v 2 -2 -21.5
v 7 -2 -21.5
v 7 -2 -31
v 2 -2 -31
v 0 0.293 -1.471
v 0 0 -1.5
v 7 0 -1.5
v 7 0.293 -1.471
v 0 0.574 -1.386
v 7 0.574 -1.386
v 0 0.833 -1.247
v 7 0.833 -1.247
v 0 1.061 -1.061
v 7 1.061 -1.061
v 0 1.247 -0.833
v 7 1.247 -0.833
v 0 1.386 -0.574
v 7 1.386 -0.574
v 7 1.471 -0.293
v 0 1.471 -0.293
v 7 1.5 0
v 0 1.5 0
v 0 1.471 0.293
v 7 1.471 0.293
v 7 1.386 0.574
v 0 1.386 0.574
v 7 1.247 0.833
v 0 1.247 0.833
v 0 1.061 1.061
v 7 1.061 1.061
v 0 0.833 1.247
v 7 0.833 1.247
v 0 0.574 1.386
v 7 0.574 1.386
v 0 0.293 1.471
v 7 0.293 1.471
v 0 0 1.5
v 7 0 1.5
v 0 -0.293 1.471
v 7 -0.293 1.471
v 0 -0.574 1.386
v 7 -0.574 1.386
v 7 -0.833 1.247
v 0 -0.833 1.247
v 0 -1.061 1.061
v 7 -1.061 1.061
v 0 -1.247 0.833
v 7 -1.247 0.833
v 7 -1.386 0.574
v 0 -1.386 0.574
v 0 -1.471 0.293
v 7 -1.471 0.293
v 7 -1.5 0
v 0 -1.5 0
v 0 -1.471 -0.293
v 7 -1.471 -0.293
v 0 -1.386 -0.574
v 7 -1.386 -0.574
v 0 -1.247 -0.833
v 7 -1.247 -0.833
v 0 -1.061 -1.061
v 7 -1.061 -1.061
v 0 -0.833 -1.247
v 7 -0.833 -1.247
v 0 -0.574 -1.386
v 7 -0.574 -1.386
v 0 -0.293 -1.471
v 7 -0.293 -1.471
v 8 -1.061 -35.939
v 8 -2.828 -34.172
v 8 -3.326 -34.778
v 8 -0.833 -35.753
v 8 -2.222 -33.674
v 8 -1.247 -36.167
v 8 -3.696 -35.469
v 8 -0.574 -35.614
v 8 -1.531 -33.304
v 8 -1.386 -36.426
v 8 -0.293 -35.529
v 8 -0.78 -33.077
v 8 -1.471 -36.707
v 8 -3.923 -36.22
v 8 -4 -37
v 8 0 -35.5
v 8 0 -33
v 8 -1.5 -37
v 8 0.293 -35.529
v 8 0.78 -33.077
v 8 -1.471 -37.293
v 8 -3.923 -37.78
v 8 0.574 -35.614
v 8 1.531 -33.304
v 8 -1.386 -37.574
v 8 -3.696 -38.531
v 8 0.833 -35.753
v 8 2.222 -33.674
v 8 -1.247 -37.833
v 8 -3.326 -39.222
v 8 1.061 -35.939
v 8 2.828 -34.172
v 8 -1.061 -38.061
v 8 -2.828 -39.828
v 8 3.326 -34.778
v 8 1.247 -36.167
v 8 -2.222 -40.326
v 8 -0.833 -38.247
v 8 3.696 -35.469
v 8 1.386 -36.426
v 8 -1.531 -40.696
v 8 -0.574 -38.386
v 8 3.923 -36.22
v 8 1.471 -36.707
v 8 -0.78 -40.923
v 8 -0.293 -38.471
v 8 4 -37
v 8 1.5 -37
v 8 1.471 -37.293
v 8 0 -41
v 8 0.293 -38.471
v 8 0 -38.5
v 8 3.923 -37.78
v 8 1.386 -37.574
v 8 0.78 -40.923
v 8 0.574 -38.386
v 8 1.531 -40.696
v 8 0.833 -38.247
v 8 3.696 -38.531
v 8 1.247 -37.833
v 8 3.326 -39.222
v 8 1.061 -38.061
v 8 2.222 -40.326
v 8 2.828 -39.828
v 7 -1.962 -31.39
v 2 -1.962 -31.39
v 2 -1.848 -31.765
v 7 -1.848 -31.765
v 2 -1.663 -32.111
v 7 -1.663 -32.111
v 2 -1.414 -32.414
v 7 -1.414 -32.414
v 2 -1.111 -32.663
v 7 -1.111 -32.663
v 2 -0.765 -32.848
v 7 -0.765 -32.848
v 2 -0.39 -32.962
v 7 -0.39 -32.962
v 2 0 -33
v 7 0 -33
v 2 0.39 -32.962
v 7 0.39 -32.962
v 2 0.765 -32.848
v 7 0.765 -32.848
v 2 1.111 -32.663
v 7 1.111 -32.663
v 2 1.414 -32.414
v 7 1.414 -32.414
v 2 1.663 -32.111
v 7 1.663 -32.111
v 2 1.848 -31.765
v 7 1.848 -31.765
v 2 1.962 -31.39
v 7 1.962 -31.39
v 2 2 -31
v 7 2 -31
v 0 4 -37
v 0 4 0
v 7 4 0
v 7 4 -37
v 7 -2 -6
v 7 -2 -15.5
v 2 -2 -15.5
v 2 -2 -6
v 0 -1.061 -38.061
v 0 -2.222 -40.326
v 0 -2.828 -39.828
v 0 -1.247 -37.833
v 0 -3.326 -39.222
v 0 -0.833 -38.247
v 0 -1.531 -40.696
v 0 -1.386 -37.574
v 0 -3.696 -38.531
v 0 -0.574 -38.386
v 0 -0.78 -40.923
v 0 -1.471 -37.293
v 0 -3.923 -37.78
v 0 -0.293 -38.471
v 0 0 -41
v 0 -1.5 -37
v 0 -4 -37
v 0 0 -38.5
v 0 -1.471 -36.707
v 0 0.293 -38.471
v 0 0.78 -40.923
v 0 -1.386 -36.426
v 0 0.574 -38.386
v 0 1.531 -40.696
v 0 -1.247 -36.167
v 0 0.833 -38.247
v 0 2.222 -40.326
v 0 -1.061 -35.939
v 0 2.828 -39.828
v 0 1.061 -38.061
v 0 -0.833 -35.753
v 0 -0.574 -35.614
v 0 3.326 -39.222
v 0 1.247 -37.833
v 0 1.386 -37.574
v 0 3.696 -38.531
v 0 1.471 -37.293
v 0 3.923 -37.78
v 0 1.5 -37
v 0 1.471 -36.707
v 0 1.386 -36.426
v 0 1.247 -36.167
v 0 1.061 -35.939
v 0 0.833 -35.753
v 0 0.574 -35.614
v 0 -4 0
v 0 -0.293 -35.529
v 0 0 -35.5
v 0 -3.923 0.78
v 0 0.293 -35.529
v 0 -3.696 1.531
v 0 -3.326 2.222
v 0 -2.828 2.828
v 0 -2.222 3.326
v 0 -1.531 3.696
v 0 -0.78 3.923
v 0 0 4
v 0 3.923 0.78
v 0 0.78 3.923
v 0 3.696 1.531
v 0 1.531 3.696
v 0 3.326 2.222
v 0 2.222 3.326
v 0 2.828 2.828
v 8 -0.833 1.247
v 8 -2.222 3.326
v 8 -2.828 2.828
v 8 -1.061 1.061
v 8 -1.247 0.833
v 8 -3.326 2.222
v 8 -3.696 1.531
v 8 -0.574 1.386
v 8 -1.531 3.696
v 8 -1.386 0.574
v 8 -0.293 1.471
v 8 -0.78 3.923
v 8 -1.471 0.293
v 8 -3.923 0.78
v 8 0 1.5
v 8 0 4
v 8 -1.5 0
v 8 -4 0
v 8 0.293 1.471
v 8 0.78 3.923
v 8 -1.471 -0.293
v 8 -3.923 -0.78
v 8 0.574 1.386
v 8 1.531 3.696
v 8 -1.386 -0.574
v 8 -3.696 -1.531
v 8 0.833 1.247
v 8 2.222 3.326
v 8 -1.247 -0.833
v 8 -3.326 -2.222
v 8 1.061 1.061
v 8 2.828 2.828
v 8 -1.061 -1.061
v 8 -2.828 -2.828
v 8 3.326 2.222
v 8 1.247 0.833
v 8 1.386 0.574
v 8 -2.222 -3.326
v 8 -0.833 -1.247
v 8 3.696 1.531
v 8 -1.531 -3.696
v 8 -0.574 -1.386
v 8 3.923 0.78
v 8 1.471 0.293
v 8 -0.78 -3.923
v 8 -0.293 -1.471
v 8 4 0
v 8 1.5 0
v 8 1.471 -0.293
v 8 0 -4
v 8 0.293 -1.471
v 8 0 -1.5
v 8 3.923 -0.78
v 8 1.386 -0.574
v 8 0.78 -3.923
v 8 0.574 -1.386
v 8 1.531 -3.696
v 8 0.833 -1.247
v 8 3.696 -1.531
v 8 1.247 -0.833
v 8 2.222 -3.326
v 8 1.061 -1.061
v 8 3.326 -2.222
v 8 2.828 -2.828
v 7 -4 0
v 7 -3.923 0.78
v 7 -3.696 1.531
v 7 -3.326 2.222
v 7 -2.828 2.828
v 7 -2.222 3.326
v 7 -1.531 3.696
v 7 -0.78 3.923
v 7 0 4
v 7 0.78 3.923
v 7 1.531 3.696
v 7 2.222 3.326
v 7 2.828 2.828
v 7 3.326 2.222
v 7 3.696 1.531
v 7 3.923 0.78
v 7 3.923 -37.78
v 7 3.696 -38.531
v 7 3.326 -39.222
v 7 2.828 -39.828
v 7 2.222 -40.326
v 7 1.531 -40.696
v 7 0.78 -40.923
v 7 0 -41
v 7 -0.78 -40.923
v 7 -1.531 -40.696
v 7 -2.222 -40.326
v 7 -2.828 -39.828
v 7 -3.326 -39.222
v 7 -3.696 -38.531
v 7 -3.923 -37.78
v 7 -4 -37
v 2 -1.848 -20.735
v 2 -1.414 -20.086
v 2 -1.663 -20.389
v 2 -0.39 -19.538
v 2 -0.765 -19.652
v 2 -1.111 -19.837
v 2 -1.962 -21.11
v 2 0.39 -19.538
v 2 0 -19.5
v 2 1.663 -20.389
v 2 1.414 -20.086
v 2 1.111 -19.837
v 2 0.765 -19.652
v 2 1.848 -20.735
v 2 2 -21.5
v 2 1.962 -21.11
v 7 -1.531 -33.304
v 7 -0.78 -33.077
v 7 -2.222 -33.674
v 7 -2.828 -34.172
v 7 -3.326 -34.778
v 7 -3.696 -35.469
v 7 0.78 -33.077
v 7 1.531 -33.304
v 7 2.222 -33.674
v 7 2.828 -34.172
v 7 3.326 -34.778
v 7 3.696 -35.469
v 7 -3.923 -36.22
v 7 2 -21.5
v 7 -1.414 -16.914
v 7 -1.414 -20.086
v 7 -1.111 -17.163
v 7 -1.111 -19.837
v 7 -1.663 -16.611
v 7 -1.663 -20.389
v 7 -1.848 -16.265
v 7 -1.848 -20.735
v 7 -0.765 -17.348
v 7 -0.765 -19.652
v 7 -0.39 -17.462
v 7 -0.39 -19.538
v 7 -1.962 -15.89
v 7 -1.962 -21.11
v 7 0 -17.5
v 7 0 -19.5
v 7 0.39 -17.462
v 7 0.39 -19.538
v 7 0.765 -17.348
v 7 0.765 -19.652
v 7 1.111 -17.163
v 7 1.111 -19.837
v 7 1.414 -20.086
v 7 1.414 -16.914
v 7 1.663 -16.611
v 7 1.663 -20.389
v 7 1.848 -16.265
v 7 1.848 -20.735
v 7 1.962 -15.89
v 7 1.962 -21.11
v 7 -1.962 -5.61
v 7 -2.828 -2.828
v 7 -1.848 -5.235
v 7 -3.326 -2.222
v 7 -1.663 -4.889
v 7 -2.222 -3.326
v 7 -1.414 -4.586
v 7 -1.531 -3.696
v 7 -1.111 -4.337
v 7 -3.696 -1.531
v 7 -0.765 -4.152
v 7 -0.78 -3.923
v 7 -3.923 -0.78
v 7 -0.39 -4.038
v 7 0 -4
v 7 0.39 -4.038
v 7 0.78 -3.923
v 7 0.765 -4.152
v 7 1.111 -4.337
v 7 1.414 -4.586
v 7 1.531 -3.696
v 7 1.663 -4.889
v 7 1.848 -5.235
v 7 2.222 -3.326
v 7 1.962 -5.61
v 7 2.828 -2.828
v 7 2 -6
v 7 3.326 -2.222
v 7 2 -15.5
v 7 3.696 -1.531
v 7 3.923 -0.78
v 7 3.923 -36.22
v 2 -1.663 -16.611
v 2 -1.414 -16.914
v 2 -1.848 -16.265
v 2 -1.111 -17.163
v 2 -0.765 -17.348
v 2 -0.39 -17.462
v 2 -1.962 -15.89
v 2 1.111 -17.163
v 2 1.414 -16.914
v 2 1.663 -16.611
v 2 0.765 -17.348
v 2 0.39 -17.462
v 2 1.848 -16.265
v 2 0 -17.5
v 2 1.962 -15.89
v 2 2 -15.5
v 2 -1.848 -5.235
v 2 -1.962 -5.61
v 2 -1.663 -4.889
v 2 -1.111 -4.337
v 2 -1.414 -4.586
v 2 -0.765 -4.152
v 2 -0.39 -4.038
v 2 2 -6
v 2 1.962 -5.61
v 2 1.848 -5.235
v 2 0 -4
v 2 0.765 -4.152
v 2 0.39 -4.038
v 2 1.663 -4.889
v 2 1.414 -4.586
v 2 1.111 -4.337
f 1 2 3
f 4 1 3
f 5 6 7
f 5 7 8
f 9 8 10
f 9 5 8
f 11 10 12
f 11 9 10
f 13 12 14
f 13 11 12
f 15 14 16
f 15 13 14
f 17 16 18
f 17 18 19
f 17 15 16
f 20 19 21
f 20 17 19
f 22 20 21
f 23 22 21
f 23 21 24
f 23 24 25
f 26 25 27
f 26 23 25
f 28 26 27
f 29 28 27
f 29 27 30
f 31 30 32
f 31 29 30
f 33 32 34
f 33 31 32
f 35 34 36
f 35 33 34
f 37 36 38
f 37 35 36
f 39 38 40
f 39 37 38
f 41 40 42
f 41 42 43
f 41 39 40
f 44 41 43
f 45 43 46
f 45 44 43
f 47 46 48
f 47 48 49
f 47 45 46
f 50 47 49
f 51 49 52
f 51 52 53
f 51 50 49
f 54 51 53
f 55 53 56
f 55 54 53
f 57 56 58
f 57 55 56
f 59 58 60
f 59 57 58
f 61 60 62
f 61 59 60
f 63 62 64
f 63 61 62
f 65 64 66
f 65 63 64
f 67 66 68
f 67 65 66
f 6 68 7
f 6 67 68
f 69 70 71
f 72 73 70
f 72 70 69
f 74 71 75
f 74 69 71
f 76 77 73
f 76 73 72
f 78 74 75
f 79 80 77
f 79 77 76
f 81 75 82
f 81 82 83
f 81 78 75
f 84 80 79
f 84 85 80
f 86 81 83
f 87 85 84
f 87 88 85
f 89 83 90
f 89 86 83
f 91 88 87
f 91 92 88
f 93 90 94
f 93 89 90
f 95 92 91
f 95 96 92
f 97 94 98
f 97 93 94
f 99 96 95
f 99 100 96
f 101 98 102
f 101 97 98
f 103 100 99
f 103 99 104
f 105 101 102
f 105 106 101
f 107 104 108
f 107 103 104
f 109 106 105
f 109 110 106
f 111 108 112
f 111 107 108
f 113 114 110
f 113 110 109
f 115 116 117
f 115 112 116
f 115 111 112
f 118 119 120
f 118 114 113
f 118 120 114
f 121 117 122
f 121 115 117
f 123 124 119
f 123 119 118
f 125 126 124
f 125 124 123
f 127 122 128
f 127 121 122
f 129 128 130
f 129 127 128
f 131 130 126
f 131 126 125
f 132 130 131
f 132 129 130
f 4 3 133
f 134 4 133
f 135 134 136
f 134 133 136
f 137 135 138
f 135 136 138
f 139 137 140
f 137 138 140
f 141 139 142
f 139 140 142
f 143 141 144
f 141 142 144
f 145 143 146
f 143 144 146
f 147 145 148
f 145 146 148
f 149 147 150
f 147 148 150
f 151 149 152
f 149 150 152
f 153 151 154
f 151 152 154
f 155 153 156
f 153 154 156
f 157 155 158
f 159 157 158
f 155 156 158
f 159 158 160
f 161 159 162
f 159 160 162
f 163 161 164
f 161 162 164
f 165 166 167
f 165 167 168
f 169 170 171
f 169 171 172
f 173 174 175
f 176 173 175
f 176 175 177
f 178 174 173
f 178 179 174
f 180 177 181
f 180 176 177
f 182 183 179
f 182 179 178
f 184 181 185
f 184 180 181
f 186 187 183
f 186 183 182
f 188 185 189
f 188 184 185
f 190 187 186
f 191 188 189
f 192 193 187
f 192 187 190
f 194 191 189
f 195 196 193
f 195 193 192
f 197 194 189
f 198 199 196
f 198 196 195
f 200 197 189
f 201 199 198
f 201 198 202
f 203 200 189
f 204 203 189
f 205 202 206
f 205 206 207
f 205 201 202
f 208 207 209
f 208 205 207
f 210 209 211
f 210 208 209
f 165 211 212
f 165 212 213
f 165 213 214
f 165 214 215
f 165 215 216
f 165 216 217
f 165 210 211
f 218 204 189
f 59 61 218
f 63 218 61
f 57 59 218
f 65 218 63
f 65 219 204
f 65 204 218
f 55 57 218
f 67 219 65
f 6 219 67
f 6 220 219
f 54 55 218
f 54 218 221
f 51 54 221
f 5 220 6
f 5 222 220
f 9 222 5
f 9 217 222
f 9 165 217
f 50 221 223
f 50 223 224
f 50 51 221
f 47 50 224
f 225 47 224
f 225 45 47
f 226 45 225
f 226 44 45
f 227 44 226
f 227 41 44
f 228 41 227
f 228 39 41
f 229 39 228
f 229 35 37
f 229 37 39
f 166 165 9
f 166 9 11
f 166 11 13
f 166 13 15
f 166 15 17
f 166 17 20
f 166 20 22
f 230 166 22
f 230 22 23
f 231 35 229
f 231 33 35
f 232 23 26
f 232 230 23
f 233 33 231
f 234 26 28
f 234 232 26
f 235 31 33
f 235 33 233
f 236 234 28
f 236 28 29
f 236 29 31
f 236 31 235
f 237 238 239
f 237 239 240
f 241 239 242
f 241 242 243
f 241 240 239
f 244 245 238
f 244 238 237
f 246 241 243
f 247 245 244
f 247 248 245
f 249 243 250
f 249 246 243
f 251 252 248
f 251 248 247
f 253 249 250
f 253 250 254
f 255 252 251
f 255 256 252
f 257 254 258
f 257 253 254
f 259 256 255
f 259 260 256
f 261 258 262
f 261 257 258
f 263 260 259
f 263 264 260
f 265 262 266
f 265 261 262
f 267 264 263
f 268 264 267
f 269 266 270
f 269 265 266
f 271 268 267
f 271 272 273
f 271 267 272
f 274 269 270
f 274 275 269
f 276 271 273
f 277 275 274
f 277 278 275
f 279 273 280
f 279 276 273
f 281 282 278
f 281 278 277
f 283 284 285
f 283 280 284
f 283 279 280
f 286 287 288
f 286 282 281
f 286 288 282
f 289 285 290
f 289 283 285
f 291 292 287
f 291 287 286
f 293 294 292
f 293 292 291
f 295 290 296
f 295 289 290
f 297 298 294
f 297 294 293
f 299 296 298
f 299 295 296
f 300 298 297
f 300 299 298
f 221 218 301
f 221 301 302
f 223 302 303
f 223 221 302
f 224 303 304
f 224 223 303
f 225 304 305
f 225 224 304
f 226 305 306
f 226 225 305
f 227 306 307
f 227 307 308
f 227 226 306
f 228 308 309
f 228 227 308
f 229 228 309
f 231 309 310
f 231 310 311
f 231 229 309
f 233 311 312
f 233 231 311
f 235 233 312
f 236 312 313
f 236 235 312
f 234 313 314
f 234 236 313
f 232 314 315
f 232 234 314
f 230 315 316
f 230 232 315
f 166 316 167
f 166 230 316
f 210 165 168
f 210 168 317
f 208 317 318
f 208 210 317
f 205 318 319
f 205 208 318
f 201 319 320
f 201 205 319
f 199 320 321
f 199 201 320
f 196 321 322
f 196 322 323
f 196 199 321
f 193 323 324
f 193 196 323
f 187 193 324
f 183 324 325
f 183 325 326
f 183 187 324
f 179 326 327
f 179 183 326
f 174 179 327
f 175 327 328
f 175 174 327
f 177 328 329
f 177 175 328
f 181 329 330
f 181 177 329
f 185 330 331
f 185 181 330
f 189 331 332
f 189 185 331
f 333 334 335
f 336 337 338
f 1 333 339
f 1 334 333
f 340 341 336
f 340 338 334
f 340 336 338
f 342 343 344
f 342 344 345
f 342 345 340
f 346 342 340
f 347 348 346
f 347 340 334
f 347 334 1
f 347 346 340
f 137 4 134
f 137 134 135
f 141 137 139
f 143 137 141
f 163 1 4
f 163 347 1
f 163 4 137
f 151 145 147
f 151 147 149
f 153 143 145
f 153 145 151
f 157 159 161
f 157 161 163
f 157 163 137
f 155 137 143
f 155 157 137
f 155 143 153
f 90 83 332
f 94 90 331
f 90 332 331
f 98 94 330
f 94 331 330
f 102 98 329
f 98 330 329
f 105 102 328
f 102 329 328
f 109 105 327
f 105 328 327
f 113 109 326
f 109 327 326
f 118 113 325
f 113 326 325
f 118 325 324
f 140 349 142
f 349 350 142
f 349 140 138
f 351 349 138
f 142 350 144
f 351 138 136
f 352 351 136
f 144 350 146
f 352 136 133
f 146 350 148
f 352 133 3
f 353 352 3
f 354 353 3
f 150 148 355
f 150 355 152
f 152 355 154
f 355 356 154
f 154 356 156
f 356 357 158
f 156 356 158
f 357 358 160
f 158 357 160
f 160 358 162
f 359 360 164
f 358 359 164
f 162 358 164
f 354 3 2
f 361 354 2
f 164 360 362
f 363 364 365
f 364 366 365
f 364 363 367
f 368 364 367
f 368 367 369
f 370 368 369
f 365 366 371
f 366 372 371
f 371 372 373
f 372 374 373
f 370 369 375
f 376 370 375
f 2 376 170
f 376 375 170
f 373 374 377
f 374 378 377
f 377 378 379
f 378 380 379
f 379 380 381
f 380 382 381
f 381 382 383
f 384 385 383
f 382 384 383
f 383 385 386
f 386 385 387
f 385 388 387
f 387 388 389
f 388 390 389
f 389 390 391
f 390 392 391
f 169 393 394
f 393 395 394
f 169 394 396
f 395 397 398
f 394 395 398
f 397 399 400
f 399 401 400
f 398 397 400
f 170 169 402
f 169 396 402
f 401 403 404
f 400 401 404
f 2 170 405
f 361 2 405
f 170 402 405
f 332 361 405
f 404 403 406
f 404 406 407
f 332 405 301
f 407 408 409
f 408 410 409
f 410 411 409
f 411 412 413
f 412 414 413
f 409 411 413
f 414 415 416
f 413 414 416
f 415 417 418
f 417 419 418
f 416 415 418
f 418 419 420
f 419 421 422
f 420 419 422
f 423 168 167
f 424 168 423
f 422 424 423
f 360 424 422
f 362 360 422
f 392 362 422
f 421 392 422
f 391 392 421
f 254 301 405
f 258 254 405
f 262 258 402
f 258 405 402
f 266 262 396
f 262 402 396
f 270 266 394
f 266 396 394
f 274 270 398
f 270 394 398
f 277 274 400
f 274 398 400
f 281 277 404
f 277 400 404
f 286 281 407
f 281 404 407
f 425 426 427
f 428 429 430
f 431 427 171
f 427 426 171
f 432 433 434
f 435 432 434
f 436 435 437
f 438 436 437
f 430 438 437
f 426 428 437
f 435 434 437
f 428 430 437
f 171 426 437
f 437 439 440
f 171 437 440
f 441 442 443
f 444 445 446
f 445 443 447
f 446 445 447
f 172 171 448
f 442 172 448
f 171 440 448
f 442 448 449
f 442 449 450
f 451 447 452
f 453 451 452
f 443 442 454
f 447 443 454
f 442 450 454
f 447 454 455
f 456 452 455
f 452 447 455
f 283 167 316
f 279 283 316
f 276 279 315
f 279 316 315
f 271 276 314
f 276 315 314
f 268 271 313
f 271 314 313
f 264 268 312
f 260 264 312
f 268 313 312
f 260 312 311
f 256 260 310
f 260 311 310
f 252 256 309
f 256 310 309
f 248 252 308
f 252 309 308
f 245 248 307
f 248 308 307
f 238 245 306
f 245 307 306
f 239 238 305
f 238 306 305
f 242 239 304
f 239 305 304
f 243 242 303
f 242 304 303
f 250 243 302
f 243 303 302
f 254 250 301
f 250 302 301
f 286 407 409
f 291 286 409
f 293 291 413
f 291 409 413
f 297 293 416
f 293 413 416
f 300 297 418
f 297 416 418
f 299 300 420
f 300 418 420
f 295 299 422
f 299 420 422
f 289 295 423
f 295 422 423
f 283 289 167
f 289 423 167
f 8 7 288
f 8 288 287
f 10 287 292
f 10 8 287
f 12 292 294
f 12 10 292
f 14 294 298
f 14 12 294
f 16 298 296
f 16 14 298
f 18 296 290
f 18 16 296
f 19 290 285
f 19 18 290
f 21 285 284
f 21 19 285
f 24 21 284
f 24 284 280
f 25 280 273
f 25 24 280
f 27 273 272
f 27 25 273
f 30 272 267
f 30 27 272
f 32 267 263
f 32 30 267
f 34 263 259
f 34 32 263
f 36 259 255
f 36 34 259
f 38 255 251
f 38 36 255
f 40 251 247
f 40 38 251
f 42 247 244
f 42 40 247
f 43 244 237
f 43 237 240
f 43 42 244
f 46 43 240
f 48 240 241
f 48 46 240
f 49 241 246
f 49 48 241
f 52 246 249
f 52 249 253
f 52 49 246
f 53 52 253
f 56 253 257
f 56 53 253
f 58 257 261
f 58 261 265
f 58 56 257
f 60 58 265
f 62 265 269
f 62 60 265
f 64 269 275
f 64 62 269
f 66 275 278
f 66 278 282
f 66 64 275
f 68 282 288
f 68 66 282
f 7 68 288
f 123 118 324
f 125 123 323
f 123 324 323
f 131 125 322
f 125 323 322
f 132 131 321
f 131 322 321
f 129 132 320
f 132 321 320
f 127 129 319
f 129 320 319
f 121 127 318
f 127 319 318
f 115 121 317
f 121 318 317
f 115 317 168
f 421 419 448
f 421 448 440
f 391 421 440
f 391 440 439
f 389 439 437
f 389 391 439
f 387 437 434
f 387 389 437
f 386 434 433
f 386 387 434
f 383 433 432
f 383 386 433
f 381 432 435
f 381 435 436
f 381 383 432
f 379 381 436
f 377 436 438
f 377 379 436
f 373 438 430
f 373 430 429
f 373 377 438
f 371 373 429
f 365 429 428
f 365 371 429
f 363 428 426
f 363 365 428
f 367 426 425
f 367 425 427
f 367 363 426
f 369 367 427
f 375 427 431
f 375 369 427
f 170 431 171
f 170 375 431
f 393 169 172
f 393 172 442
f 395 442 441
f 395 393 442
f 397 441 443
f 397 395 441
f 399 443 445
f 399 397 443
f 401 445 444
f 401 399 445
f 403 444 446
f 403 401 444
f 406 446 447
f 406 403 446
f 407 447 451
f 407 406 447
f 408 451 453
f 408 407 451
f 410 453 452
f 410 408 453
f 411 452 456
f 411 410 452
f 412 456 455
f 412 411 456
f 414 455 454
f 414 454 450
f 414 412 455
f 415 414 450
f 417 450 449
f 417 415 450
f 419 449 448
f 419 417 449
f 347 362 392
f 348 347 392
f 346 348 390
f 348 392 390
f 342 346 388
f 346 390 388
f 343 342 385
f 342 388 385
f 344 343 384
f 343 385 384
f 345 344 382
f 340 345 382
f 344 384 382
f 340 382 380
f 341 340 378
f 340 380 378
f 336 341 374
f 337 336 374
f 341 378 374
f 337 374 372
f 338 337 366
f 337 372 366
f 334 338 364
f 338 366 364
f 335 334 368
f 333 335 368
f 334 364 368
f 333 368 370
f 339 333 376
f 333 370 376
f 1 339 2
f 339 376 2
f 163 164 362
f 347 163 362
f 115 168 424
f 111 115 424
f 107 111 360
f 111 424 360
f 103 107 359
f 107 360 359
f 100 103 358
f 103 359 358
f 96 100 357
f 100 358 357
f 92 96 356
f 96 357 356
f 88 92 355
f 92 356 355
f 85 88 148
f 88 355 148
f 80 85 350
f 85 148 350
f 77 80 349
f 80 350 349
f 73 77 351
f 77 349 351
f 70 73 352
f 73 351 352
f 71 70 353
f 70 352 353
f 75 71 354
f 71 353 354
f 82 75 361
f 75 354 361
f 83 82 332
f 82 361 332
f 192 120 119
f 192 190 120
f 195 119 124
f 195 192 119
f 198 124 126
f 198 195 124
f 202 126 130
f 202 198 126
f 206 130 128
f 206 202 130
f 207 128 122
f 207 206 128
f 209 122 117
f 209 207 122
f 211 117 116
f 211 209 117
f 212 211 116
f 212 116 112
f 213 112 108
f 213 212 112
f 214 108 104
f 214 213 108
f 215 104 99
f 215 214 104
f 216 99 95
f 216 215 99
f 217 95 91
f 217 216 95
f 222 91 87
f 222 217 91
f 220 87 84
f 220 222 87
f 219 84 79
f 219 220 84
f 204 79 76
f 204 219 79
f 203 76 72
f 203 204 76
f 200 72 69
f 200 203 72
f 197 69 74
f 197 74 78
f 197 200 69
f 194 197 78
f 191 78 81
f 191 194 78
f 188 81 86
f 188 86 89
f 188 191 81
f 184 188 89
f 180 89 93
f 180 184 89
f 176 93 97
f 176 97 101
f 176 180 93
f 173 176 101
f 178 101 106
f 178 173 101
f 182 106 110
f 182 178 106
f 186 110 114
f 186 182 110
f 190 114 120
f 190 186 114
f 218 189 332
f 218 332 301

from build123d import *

# Parameters (mm, degrees)
SKETCH_2_R          = 1.5
EXTRUDE_1_DEPTH     = 7
CUT_EXTRUDE_1_DEPTH = 5
SKETCH_4_R          = 1.5
EXTRUDE_2_DEPTH     = 1


with BuildPart() as part:
    # 草图2 → 凸台-拉伸1 (new body)
    with BuildSketch(Plane(origin=(0, 0, 0), x_dir=(0, 0, -1), z_dir=(1, 0, 0))):
        with BuildLine():
            Line((0, 4), (37, 4))
            ThreePointArc((37, 4), (41, 0), (37, -4))
            Line((37, -4), (0, -4))
            ThreePointArc((0, -4), (-4, 0), (0, 4))
        make_face()
        Circle(SKETCH_2_R, mode=Mode.SUBTRACT)
        with Locations((37, 0)):
            Circle(SKETCH_2_R, mode=Mode.SUBTRACT)
    extrude(amount=EXTRUDE_1_DEPTH)

    # 草图3 → 切除-拉伸1 (cut)
    with BuildSketch(Plane(origin=(7, 0, 0), x_dir=(0, 0, -1), z_dir=(1, 0, 0))):
        with BuildLine():
            Line((15.5, -2), (6, -2))
            ThreePointArc((6, -2), (4, 0), (6, 2))
            Line((6, 2), (15.5, 2))
            ThreePointArc((15.5, 2), (17.5, 0), (15.5, -2))
        make_face()
        with BuildLine():
            Line((21.5, -2), (31, -2))
            ThreePointArc((31, -2), (33, 0), (31, 2))
            Line((31, 2), (21.5, 2))
            ThreePointArc((21.5, 2), (19.5, 0), (21.5, -2))
        make_face()
    extrude(amount=-CUT_EXTRUDE_1_DEPTH, mode=Mode.SUBTRACT)

    # 草图4 → 凸台-拉伸2 (add)
    # profile 1 of 2: a face of its own
    with BuildSketch(Plane(origin=(7, 0, 0), x_dir=(0, 0, -1), z_dir=(1, 0, 0))):
        with BuildLine():
            ThreePointArc((37, -4), (39.828427125, -2.828427125), (41, 0))
            ThreePointArc((41, 0), (39.828427125, 2.828427125), (37, 4))
            ThreePointArc((37, 4), (33, 0), (37, -4))
        make_face()
        with Locations((37, 0)):
            Circle(SKETCH_4_R, mode=Mode.SUBTRACT)
    # profile 2 of 2: a face of its own
    with BuildSketch(Plane(origin=(7, 0, 0), x_dir=(0, 0, -1), z_dir=(1, 0, 0))):
        with BuildLine():
            ThreePointArc((0, -4), (2.828427125, -2.828427125), (4, 0))
            ThreePointArc((4, 0), (2.828427125, 2.828427125), (0, 4))
            ThreePointArc((0, 4), (-4, 0), (0, -4))
        make_face()
        Circle(SKETCH_4_R, mode=Mode.SUBTRACT)
    extrude(amount=EXTRUDE_2_DEPTH)


solid = part.part
